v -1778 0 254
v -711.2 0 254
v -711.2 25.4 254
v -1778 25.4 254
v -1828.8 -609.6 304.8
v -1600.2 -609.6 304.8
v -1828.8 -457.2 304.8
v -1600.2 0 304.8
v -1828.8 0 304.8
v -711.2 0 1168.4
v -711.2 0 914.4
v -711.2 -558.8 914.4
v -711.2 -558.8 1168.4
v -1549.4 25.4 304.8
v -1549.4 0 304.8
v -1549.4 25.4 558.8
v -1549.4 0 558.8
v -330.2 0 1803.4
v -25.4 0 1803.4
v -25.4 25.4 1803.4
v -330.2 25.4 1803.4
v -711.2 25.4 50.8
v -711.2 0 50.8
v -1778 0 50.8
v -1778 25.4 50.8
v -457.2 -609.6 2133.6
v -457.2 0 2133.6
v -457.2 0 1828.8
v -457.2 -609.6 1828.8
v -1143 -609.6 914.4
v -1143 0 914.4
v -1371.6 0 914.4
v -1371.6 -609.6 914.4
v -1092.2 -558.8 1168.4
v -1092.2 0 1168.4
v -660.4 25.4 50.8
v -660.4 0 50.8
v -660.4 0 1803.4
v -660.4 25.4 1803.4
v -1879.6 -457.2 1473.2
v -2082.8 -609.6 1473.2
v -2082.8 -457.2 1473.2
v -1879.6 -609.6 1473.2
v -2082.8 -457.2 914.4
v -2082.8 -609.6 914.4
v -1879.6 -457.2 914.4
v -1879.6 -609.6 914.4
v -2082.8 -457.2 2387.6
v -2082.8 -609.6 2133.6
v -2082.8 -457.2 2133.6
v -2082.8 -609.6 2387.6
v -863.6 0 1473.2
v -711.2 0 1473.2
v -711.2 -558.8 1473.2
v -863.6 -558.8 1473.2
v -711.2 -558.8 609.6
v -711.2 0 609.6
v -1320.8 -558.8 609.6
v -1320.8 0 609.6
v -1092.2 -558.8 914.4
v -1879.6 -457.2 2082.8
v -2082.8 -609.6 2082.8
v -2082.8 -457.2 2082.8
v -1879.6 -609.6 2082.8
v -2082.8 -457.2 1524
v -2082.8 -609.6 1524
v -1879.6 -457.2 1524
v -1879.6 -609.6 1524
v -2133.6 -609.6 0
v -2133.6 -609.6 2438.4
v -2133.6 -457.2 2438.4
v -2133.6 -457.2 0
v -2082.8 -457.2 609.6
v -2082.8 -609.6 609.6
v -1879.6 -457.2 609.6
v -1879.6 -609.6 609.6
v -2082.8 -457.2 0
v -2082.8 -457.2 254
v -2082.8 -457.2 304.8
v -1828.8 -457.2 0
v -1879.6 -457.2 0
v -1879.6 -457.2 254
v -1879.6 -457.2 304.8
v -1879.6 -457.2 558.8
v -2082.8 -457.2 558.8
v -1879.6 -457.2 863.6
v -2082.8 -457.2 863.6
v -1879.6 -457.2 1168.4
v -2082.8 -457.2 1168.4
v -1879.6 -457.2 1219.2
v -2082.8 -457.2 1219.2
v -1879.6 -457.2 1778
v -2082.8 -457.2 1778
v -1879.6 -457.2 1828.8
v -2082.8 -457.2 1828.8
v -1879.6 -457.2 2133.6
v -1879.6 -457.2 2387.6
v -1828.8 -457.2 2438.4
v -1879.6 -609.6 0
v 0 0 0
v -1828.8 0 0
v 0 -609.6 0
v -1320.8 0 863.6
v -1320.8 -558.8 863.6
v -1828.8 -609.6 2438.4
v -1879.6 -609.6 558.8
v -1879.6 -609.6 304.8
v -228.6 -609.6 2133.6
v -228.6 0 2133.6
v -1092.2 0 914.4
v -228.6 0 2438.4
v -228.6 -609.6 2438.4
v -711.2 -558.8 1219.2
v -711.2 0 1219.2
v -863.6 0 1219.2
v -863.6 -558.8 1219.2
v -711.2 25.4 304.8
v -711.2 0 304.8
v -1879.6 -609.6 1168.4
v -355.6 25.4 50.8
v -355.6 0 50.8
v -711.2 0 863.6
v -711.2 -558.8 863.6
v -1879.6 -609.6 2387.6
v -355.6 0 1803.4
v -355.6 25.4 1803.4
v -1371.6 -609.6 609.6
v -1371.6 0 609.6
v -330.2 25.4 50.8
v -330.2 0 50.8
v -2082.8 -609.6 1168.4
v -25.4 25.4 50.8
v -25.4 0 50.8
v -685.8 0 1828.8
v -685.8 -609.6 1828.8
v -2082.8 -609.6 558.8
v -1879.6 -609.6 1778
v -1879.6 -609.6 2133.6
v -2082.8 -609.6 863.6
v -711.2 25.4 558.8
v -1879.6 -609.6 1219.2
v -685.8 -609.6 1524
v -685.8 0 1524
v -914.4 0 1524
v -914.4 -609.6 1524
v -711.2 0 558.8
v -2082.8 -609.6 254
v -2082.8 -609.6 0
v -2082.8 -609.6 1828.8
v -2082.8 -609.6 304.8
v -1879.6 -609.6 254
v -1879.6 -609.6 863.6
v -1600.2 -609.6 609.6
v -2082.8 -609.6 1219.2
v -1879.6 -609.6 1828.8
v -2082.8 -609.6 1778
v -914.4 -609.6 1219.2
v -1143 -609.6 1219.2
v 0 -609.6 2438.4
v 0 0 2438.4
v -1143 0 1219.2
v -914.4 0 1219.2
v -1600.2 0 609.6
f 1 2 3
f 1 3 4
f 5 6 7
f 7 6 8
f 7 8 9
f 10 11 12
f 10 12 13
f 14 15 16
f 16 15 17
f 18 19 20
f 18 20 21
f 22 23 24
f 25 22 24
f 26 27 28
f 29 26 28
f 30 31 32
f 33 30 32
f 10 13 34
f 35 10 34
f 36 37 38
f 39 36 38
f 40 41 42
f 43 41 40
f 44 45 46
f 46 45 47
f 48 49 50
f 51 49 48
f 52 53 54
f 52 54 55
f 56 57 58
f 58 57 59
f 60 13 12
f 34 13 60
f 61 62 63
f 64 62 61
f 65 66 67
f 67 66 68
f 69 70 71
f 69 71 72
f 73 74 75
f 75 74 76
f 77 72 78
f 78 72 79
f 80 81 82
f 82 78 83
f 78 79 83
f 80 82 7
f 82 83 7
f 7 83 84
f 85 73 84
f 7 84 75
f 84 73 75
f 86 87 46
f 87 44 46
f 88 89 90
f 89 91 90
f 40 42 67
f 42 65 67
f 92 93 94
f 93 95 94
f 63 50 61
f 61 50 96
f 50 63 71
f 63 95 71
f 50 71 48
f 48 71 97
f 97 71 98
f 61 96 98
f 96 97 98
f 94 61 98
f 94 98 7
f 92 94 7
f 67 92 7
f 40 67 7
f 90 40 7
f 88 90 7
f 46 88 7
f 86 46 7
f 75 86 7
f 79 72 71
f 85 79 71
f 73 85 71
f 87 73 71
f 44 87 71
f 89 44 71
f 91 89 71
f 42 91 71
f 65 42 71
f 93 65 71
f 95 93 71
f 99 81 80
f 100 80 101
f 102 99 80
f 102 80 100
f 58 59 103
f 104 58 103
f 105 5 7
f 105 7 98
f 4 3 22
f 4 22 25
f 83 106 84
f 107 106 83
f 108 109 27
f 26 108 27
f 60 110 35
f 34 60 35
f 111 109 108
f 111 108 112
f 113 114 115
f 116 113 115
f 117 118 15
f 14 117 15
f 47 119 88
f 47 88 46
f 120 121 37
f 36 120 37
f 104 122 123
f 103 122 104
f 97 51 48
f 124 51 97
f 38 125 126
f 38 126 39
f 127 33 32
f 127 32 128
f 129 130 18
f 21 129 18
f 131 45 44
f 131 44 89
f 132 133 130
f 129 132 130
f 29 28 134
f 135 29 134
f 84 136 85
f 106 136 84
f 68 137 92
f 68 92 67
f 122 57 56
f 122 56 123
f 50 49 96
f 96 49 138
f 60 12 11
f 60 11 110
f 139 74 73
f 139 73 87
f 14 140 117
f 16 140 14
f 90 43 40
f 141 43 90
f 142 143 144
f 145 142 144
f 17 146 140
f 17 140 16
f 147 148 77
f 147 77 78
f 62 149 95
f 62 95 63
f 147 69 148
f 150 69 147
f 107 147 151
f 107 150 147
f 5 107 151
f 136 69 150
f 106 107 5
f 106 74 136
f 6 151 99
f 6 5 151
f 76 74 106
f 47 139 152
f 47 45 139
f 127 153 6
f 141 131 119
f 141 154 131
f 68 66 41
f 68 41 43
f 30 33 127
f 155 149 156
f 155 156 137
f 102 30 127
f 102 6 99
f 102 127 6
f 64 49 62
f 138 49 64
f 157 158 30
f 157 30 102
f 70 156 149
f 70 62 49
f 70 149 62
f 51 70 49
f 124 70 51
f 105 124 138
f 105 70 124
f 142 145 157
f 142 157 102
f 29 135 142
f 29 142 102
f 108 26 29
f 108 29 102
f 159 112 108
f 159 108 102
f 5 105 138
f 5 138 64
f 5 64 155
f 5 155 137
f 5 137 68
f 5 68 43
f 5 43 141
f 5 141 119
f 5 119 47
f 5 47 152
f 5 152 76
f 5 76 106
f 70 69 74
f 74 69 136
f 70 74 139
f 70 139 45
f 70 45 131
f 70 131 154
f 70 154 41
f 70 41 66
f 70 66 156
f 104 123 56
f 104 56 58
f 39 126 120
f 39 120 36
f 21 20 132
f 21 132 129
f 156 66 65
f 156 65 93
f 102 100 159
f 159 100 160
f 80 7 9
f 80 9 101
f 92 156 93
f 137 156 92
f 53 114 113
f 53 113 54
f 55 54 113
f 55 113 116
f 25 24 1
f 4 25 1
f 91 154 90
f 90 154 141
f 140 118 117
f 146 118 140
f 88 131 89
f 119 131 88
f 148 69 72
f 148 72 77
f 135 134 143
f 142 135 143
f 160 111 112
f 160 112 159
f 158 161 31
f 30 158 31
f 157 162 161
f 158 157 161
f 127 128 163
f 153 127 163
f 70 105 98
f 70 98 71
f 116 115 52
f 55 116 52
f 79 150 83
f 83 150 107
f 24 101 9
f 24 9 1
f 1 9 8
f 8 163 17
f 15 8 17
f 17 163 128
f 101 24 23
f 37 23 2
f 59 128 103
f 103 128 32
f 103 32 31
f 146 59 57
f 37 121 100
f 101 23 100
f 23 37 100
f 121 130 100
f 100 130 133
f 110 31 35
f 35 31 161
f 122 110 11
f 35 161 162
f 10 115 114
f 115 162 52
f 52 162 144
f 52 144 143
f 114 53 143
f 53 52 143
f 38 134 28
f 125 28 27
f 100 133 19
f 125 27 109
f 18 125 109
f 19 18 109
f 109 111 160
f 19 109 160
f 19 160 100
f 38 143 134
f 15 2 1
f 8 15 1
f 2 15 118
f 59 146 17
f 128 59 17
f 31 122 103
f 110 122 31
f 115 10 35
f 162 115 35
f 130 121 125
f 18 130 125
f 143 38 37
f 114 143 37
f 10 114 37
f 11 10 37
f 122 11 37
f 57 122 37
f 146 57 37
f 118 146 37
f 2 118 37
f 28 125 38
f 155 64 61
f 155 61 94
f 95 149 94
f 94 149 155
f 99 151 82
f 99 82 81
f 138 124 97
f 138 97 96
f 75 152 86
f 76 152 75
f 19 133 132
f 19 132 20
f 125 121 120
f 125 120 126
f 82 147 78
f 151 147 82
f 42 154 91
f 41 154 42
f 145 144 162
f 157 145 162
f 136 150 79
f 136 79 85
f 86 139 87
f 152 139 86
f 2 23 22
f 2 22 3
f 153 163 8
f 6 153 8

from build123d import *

# Parameters (mm, degrees)
F0_W     = 228.6
F0_H     = 304.8
F1_DEPTH = 609.6
F2_W     = 203.199796
F2_H     = 50.8
F3_DEPTH = 152.4
F4_W     = 152.4
F4_H     = 254
F4_W_2   = 381
F4_W_3   = 609.6
F5_DEPTH = 558.8
F4_W_4   = 304.8
F4_H_2   = 1752.6
F4_W_5   = 838.2
F4_W_6   = 1066.8
F4_H_3   = 203.2
F6_DEPTH = 25.4


with BuildPart() as f1:
    # F0 (on Front) → F1 (new body)
    with BuildSketch(Plane.XZ):
        Polygon((-1828.8, 304.8), (-1828.8, 0), (0, 0), (0, 304.8), (-1600.2, 304.8), align=None)
        Polygon((-1600.2, 304.8), (0, 304.8), (0, 609.6), (-1371.6, 609.6), (-1600.2, 609.6), align=None)
        Polygon((-1371.6, 609.6), (0, 609.6), (0, 914.4), (-1143, 914.4), (-1371.6, 914.4), align=None)
        Polygon((-1143, 914.4), (0, 914.4), (0, 1219.2), (-914.4, 1219.2), (-1143, 1219.2), align=None)
        Polygon((-914.4, 1219.2), (0, 1219.2), (0, 1524), (-685.8, 1524), (-914.4, 1524), align=None)
        Polygon((-685.8, 1524), (0, 1524), (0, 1828.8), (-457.2, 1828.8), (-685.8, 1828.8), align=None)
        Polygon((-457.2, 1828.8), (0, 1828.8), (0, 2133.6), (-228.6, 2133.6), (-457.2, 2133.6), align=None)
        with Locations((-114.3, 2286)):
            Rectangle(F0_W, F0_H)
    extrude(amount=F1_DEPTH)

    # F2 (on face) → F3 (join)
    with BuildSketch(Plane.XZ.offset(609.6)):
        Polygon((-1879.600102, 0), (-1828.8, 0), (-1828.8, 2438.4), (-1879.600102, 2438.4), (-1879.600102, 2387.6), (-1879.600102, 2340.422869), (-1879.600102, 2133.6), (-1879.600102, 2082.8), (-1879.600102, 1828.8), (-1879.600102, 1778), (-1879.600102, 1524), (-1879.600102, 1473.2), (-1879.600102, 1219.2), (-1879.600102, 1168.4), (-1879.600102, 914.4), (-1879.600102, 863.6), (-1879.600102, 609.6), (-1879.600102, 558.8), (-1879.600102, 304.8), (-1879.600102, 254), align=None)
        with Locations((-1981.2, 279.4)):
            Rectangle(F2_W, F2_H)
        with Locations((-1981.2, 2413)):
            Rectangle(F2_W, F2_H)
        Polygon((-2082.799898, 0), (-2082.799898, 254), (-2082.799898, 304.8), (-2082.799898, 558.8), (-2082.799898, 609.6), (-2082.799898, 863.6), (-2082.799898, 914.4), (-2082.799898, 1168.4), (-2082.799898, 1219.2), (-2082.799898, 1473.2), (-2082.799898, 1524), (-2082.799898, 1778), (-2082.799898, 1828.8), (-2082.799898, 2082.8), (-2082.799898, 2133.6), (-2082.799898, 2340.422869), (-2082.799898, 2387.6), (-2082.799898, 2438.4), (-2133.6, 2438.4), (-2133.6, 0), align=None)
        with Locations((-1981.2, 2108.2)):
            Rectangle(F2_W, F2_H)
        with Locations((-1981.2, 1803.4)):
            Rectangle(F2_W, F2_H)
        with Locations((-1981.2, 1498.6)):
            Rectangle(F2_W, F2_H)
        with Locations((-1981.2, 1193.8)):
            Rectangle(F2_W, F2_H)
        with Locations((-1981.2, 889)):
            Rectangle(F2_W, F2_H)
        with Locations((-1981.2, 584.2)):
            Rectangle(F2_W, F2_H)
    extrude(amount=-F3_DEPTH)

    # F4 (on face) → F5 (cut)
    with BuildSketch(Plane(origin=(0, 0, 0), x_dir=(-1, 0, 0), z_dir=(0, 1, 0))):
        with Locations((787.4, 1346.2)):
            Rectangle(F4_W, F4_H)
        with Locations((901.7, 1041.4)):
            Rectangle(F4_W_2, F4_H)
        with Locations((1016, 736.6)):
            Rectangle(F4_W_3, F4_H)
    extrude(amount=-F5_DEPTH, mode=Mode.SUBTRACT)

    # F4 (on face) → F6 (join)
    with BuildSketch(Plane(origin=(0, 0, 0), x_dir=(-1, 0, 0), z_dir=(0, 1, 0))):
        with Locations((177.8, 927.1)):
            Rectangle(F4_W_4, F4_H_2)
        with Locations((508, 927.1)):
            Rectangle(F4_W_4, F4_H_2)
        with Locations((1130.3, 431.8)):
            Rectangle(F4_W_5, F4_H)
        with Locations((1244.6, 152.4)):
            Rectangle(F4_W_6, F4_H_3)
    extrude(amount=F6_DEPTH)


solid = f1.part
